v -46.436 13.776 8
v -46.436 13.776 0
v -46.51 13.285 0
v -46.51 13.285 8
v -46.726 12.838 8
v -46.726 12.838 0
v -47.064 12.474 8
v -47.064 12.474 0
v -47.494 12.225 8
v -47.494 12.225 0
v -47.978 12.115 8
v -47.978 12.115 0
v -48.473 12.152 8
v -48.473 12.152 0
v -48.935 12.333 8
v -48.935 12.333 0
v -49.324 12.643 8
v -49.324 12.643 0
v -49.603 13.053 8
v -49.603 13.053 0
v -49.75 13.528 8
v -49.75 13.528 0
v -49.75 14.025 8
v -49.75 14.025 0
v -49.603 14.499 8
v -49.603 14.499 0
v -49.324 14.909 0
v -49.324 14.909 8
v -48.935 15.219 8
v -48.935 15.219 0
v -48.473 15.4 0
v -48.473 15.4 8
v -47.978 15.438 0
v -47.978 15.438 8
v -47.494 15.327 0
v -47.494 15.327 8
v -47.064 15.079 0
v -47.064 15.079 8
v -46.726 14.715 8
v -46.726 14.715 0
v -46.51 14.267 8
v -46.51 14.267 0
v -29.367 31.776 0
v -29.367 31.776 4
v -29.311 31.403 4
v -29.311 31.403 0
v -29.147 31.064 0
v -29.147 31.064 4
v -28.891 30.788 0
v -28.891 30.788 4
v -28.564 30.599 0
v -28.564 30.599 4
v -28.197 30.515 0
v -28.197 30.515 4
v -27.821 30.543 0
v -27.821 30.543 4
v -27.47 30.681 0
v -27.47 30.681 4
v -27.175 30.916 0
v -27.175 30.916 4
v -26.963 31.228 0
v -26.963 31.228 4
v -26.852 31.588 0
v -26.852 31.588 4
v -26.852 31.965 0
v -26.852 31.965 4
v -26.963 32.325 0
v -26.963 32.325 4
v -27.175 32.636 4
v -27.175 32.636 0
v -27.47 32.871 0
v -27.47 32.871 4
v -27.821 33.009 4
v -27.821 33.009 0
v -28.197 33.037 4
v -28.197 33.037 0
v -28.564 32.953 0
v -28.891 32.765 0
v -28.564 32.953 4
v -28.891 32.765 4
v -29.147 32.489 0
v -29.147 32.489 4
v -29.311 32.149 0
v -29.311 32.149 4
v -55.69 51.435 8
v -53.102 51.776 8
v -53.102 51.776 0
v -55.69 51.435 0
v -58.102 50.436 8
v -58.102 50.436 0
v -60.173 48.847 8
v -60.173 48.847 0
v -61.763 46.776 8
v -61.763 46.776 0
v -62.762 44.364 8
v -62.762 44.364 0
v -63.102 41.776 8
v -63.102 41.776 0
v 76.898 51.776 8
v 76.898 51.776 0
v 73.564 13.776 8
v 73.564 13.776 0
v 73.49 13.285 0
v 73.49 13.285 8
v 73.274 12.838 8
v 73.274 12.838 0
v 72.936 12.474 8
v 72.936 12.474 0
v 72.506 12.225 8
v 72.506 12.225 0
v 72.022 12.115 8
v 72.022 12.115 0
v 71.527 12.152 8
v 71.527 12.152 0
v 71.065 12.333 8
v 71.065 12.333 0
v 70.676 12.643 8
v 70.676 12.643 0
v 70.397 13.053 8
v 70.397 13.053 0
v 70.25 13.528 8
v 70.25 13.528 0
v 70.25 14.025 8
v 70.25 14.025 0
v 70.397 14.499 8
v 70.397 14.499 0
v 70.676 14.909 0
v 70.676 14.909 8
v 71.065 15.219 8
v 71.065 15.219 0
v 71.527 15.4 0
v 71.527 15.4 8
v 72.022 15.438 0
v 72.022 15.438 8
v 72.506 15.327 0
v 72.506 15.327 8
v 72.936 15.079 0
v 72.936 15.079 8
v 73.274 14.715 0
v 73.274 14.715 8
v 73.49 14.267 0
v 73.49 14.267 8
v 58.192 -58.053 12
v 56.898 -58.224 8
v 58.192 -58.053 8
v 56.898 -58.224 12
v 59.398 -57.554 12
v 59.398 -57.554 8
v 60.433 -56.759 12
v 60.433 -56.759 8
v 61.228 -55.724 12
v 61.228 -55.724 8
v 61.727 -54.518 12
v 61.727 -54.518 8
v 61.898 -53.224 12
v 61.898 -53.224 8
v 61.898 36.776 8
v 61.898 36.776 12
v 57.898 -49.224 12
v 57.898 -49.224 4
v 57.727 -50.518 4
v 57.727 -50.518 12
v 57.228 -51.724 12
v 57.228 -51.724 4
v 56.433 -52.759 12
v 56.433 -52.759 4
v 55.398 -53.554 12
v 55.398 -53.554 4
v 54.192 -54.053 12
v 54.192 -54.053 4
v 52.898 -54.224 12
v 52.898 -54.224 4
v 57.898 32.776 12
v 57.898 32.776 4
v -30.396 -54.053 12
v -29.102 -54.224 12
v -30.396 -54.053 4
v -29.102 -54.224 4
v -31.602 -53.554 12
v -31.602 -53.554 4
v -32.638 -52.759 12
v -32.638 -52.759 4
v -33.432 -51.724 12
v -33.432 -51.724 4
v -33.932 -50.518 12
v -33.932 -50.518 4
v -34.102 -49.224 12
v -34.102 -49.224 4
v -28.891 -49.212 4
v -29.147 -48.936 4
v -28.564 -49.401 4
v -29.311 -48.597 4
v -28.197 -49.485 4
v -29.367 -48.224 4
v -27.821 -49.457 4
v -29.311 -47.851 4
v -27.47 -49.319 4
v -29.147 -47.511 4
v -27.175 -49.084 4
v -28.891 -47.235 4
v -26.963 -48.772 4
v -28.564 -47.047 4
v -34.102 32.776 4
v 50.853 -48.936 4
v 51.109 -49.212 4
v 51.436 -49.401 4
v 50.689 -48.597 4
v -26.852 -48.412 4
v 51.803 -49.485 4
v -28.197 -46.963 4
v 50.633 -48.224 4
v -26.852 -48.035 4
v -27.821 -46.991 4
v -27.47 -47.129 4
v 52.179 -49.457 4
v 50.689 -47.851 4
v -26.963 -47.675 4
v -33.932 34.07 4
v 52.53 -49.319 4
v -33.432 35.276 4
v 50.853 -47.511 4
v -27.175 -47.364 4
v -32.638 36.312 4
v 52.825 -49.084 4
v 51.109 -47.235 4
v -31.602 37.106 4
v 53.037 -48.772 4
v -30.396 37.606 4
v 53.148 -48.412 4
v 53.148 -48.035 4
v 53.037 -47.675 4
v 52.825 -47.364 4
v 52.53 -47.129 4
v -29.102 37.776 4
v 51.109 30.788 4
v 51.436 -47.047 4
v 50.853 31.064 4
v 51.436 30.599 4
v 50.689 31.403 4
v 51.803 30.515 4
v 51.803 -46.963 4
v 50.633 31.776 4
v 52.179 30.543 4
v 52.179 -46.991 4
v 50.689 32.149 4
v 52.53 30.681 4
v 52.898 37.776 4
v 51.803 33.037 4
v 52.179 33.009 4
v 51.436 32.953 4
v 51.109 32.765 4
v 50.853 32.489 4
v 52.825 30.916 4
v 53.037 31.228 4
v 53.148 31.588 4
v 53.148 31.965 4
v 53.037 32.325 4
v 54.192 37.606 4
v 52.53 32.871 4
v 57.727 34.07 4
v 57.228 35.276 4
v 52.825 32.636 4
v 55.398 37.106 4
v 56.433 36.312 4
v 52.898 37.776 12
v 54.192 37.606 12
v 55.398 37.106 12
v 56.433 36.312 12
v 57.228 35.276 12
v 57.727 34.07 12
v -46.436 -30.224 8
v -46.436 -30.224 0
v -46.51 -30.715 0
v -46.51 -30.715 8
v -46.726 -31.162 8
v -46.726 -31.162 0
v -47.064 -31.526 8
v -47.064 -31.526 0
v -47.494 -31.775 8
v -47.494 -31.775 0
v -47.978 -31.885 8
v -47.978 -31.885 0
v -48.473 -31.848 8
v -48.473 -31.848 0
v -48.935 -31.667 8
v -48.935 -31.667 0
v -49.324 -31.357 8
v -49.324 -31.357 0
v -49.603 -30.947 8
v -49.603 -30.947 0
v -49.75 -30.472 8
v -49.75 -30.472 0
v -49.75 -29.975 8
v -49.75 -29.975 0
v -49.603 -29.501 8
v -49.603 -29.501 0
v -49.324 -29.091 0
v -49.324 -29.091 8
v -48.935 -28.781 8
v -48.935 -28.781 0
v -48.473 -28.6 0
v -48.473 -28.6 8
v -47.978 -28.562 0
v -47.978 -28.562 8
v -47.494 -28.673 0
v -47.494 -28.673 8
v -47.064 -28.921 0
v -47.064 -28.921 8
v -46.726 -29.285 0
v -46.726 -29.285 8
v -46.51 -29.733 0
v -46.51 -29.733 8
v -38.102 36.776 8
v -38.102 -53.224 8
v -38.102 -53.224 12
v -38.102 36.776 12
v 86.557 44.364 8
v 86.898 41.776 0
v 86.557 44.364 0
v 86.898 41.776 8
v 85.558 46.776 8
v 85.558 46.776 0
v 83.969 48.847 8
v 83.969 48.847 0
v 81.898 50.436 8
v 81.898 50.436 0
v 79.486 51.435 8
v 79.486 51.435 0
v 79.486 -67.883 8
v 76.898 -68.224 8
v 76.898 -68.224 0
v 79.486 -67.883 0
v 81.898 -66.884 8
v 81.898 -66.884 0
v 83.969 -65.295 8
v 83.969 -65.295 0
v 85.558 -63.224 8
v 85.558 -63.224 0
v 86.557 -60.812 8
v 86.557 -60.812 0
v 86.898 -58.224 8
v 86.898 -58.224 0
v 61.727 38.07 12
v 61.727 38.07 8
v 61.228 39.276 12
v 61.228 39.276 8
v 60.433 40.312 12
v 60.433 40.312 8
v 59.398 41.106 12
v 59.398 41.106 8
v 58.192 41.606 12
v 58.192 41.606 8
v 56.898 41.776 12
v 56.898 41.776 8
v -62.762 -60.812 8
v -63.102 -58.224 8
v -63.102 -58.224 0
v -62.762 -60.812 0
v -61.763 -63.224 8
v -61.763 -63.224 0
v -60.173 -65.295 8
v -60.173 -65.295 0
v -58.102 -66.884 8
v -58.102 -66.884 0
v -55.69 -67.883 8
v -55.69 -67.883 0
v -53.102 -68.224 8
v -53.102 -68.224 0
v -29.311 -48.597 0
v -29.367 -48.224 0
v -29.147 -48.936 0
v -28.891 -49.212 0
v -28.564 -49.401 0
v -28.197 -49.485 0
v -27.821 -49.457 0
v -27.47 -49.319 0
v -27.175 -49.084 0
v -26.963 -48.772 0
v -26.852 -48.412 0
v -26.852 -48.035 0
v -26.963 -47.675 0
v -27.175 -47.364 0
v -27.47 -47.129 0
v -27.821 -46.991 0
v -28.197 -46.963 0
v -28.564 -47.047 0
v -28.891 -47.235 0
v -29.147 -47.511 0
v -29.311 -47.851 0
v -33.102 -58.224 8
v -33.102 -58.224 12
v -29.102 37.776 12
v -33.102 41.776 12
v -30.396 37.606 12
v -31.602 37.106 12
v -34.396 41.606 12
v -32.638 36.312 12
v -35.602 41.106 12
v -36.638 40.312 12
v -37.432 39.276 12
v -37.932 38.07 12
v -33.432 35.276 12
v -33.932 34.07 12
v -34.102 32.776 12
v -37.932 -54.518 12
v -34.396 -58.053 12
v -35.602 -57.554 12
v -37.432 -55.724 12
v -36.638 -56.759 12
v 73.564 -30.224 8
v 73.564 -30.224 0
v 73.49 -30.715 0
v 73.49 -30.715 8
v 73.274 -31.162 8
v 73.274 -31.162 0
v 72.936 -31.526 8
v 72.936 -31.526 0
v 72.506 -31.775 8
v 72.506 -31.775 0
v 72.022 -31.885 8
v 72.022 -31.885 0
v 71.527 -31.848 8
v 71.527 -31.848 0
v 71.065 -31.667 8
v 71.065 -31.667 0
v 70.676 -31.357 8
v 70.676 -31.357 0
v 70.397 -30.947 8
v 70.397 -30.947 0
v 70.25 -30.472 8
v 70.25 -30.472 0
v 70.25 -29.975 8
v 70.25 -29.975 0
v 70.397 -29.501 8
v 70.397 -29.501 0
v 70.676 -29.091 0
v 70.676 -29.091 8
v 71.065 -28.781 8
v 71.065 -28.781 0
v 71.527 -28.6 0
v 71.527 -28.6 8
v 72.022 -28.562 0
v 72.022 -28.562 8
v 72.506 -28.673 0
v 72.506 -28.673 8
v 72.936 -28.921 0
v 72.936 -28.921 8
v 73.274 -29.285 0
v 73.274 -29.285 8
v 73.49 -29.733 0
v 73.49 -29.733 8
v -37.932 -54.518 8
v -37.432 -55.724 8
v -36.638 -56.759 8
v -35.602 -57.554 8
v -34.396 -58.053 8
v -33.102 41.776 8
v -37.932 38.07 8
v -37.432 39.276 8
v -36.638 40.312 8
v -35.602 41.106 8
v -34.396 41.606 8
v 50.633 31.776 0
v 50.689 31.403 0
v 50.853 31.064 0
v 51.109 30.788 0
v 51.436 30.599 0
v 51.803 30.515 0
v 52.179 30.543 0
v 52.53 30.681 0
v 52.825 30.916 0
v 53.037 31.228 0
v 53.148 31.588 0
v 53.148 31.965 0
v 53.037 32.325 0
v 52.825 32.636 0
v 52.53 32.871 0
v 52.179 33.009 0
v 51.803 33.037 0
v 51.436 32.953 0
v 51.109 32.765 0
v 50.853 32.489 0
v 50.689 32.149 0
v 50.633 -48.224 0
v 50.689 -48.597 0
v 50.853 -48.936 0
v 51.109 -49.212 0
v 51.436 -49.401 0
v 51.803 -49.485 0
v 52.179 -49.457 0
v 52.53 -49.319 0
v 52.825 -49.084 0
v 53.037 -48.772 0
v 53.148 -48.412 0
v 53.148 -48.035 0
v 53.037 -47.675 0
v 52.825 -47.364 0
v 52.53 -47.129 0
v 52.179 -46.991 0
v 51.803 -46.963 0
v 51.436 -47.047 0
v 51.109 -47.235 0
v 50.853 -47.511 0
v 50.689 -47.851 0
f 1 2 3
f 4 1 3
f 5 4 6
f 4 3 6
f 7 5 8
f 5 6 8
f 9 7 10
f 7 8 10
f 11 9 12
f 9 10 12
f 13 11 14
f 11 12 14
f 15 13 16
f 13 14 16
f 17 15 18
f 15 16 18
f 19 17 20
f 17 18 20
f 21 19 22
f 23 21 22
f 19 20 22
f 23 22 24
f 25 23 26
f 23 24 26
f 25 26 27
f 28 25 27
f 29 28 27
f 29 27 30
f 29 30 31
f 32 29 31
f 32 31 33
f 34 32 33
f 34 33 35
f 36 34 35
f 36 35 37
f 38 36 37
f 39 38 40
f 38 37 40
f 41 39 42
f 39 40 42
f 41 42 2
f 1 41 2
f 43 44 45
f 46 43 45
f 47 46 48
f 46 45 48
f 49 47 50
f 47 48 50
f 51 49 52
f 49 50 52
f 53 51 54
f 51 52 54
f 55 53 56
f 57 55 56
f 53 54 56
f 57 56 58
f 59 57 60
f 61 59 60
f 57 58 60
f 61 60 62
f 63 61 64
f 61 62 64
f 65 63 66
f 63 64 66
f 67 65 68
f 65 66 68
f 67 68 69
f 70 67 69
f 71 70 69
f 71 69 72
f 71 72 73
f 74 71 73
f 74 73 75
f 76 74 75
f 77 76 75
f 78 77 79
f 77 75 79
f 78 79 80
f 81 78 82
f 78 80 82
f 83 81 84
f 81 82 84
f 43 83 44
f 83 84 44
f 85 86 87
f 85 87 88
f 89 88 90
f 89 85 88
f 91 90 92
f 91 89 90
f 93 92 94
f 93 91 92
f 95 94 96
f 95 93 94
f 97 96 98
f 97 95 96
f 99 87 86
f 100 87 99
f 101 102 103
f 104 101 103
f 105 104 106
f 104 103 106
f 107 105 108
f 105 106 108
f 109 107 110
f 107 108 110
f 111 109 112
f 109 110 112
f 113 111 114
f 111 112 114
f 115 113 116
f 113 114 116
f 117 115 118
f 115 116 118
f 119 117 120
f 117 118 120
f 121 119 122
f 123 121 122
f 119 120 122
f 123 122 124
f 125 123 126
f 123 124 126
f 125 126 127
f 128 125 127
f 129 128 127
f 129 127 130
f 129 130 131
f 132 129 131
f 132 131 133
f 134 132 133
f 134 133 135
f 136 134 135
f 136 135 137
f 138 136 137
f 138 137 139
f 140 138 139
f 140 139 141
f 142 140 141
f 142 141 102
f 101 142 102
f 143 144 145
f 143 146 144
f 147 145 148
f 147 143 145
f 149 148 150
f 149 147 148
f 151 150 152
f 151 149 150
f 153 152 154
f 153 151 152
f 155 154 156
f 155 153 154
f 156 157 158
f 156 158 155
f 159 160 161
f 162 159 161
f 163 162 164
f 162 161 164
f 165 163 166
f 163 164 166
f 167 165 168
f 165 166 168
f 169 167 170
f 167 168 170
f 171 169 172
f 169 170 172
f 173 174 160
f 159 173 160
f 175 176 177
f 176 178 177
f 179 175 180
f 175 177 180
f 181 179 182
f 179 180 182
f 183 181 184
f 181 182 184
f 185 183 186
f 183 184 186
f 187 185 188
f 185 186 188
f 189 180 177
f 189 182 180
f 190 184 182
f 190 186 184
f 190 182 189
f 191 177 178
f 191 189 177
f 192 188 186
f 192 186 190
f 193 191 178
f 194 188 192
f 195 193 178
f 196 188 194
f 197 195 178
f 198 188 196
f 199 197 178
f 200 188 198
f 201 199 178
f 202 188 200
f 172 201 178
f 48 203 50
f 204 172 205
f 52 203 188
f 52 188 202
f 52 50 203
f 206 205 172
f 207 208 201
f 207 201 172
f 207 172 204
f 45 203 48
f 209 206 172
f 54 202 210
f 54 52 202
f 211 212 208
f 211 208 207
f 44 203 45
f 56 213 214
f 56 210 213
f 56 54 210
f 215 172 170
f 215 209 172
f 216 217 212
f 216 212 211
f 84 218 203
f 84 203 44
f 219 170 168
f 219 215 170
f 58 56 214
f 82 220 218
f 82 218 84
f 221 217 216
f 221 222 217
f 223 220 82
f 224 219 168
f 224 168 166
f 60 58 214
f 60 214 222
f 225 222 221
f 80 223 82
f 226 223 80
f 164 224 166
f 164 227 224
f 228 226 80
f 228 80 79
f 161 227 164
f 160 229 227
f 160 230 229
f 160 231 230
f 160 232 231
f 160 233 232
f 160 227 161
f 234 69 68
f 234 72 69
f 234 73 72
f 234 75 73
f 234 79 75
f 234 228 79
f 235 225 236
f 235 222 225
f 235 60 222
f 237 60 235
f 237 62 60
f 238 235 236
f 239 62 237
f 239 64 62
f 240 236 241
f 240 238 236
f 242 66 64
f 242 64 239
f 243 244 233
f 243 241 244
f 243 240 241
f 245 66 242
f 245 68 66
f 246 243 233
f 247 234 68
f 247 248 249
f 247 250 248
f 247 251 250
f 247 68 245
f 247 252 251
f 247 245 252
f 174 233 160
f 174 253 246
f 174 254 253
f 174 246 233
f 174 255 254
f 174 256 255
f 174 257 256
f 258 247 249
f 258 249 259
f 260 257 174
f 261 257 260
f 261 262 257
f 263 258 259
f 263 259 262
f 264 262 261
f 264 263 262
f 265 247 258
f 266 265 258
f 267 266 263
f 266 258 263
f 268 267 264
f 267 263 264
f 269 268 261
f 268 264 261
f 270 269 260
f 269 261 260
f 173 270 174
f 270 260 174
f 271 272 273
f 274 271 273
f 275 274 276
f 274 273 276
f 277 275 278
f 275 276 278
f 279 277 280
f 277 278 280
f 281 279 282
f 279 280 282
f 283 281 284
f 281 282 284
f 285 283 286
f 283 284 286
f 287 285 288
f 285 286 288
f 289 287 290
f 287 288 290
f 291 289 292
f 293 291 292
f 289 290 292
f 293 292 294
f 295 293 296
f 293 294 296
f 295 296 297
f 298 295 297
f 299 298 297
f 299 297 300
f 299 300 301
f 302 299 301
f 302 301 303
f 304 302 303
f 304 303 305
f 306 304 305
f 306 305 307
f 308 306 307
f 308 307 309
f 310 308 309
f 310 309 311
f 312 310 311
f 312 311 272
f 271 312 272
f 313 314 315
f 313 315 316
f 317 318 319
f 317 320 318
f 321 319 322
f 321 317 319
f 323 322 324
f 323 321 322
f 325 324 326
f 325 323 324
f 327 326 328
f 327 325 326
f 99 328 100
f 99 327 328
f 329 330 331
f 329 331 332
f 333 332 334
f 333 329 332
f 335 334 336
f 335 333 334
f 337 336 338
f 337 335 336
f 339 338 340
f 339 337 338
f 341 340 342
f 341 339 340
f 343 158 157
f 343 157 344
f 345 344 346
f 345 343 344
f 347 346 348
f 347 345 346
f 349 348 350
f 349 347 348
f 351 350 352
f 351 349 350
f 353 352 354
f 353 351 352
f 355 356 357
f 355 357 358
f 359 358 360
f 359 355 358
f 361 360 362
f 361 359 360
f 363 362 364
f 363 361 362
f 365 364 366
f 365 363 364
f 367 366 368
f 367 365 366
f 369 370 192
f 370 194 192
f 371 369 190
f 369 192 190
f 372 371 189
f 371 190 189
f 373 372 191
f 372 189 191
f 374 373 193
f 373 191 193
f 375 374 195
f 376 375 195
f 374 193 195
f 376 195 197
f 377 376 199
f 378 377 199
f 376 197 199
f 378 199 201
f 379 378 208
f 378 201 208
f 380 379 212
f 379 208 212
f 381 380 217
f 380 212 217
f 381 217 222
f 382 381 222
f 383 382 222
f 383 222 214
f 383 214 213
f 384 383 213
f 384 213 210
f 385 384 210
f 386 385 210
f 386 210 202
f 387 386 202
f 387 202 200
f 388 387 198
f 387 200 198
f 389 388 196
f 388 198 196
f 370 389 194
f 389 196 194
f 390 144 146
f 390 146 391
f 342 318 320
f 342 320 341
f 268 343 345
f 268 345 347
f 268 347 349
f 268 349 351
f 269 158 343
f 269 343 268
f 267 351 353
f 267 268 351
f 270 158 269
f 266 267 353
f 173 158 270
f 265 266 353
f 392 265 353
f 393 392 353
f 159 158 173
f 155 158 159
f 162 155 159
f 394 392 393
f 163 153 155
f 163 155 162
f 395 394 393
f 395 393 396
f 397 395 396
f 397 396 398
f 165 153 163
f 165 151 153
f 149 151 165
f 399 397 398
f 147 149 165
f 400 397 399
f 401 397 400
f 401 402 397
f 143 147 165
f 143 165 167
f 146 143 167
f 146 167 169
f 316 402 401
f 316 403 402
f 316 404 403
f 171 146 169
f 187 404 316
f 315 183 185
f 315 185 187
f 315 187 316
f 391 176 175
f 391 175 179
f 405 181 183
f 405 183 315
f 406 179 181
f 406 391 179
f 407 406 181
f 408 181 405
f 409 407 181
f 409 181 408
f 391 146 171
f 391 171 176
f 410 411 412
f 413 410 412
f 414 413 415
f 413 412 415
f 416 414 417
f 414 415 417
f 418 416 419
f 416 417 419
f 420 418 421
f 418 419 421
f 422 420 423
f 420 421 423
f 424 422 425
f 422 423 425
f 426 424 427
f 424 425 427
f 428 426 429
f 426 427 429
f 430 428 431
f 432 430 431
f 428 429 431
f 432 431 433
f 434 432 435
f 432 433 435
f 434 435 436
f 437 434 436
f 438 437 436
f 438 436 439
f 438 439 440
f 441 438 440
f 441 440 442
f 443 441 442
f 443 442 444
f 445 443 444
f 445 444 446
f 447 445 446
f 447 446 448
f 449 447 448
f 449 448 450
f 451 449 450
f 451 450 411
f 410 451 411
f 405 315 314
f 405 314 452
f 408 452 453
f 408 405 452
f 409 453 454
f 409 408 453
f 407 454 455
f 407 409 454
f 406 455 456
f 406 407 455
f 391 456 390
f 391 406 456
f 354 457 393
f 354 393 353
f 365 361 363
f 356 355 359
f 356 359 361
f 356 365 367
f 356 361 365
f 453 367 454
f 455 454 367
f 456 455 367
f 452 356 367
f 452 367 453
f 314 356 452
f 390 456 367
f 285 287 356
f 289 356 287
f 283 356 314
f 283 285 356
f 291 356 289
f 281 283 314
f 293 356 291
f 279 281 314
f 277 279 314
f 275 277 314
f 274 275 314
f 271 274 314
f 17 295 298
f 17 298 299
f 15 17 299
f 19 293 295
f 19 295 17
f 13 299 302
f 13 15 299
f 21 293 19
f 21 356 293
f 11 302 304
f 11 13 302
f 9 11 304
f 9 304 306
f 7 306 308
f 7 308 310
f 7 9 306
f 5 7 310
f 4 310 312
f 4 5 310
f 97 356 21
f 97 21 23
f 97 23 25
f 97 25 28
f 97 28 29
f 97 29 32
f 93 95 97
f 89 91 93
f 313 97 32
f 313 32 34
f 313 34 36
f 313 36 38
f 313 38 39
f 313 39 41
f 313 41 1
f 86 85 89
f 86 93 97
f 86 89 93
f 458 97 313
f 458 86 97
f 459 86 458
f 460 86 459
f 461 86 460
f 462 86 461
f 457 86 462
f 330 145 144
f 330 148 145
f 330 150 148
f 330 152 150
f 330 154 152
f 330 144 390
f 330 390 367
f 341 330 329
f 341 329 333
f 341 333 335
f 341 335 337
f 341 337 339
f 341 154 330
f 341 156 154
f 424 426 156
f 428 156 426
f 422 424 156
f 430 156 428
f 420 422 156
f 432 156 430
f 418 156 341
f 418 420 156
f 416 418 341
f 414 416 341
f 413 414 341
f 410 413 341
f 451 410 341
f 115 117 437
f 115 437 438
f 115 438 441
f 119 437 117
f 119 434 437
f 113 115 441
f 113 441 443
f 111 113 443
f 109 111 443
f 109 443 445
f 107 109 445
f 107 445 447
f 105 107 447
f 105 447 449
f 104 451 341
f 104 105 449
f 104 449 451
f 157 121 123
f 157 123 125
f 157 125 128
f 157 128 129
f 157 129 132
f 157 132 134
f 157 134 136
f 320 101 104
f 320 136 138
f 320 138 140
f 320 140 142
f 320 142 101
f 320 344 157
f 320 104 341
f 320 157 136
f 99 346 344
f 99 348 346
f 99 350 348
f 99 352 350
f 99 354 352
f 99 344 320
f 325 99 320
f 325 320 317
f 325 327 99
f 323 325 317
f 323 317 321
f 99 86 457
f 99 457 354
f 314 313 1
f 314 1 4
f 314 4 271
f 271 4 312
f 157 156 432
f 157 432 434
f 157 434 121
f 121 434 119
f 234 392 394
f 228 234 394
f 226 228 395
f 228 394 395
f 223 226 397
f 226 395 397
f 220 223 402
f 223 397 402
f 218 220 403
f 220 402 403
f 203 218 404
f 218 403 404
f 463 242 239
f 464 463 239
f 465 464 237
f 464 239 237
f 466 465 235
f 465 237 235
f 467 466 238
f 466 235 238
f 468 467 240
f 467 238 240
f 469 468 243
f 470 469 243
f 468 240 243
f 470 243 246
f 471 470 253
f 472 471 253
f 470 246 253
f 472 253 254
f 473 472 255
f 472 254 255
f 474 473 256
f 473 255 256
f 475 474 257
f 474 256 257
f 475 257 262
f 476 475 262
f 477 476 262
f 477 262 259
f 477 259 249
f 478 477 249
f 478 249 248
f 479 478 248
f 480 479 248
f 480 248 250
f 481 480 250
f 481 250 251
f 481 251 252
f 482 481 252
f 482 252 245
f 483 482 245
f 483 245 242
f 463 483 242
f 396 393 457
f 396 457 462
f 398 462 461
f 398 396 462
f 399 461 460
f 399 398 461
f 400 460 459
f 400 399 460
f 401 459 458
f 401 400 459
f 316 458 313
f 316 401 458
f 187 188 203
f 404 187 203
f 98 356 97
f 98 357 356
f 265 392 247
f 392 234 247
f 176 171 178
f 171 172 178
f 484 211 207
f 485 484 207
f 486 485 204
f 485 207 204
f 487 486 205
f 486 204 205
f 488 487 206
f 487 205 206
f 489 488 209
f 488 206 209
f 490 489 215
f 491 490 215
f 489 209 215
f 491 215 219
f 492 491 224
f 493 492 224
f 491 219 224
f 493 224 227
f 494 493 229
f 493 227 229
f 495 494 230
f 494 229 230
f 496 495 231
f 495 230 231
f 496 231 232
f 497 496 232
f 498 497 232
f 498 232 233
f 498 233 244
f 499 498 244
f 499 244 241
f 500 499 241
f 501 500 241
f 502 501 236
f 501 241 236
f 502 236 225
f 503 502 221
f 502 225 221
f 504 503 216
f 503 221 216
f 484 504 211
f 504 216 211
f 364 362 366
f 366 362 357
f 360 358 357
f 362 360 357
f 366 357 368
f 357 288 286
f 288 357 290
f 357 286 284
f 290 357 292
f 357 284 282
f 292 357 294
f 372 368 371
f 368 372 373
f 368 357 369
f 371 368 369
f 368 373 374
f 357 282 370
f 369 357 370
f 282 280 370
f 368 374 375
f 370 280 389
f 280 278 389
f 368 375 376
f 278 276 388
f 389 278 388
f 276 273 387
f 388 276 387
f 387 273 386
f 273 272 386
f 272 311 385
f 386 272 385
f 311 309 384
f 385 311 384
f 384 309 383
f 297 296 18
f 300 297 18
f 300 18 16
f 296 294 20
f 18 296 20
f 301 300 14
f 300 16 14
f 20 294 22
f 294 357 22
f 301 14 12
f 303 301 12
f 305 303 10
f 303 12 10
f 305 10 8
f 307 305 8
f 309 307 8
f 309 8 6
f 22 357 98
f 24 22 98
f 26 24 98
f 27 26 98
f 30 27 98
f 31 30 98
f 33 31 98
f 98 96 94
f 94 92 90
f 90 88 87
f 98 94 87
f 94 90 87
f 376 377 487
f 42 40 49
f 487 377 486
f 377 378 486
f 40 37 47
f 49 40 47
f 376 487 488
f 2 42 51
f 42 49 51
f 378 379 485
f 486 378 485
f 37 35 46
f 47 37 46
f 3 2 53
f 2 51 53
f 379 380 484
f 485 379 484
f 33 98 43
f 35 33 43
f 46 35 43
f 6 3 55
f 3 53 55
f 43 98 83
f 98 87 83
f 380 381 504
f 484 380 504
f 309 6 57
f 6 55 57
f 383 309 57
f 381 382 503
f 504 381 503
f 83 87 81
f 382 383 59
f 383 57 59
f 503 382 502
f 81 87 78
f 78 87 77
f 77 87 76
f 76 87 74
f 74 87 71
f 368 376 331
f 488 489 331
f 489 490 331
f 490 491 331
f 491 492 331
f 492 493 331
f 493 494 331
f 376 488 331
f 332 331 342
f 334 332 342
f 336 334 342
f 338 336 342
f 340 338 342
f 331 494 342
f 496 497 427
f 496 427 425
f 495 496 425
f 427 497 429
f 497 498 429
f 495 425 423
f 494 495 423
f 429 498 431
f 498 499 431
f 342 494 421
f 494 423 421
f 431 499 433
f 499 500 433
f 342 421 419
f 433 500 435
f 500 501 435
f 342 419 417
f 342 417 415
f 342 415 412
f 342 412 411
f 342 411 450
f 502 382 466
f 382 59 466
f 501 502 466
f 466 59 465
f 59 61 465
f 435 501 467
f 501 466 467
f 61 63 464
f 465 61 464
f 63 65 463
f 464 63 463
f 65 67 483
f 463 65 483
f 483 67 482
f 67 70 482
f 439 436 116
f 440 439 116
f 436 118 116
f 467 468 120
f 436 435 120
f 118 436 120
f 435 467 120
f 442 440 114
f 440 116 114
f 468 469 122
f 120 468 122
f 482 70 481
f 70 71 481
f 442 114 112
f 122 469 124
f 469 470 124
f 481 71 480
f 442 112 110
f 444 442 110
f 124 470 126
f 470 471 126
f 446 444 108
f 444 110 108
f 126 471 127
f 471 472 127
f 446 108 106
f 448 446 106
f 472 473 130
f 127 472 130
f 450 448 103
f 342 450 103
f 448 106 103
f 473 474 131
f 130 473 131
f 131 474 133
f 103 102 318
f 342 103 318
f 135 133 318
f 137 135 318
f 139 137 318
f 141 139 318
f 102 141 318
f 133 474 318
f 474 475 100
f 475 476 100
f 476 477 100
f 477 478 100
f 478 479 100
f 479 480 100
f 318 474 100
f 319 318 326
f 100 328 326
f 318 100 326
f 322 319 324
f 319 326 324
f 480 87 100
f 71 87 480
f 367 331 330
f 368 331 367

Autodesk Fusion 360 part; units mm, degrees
sketch "스케치1" plane through (0, 0, 0) normal (0, 0, 1) x (1, 0, 0)
  line L0 (-63.1023, 51.7762) -> (86.8977, 51.7762)
  line L1 (86.8977, 51.7762) -> (86.8977, -68.2238)
  line L2 (86.8977, -68.2238) -> (-63.1023, -68.2238)
  line L3 (-63.1023, -68.2238) -> (-63.1023, 51.7762)
  line L4 (-63.1023, -8.2238) -> (86.8977, -8.2238) construction
  point P0 (-63.1023, -8.2238)
  point P1 (86.8977, -8.2238)
  point P2 (11.8977, -8.2238)
  dimension "d1" = 150
  dimension "d2" = 120
sketch "스케치3" plane through (0, 0, 0) normal (0, 0, 1) x (1, 0, 0)
extrude "돌출2" add sketch "스케치1" along normal blind 8
sketch "스케치4" plane through (0, 0, 8) normal (0, 0, 1) x (-1, 0, 0)
  line L0 (63.1023, 68.2238) -> (-86.8977, 68.2238)
  line L1 (-86.8977, 68.2238) -> (-86.8977, -51.7762)
  line L2 (-86.8977, -51.7762) -> (63.1023, -51.7762)
  line L3 (63.1023, -51.7762) -> (63.1023, 68.2238)
  line L4 (38.1023, -41.7762) -> (-61.8977, -41.7762)
  line L5 (-61.8977, -41.7762) -> (-61.8977, 58.2238)
  line L6 (-61.8977, 58.2238) -> (38.1023, 58.2238)
  line L7 (38.1023, 58.2238) -> (38.1023, -41.7762)
  line L8 (34.1023, -37.7762) -> (-57.8977, -37.7762)
  line L9 (-57.8977, -37.7762) -> (-57.8977, 54.2238)
  line L10 (-57.8977, 54.2238) -> (34.1023, 54.2238)
  line L11 (34.1023, 54.2238) -> (34.1023, -37.7762)
  line L12 (63.1023, -51.7762) -> (-86.8977, -51.7762)
  line L13 (-86.8977, 68.2238) -> (63.1023, 68.2238)
  line L14 (-11.8977, -51.7762) -> (-11.8977, 68.2238) construction
  line L15 (63.1023, 68.2238) -> (63.1023, -51.7762) construction
  line L16 (63.1023, 8.2238) -> (-86.8977, 8.2238) construction
  line L17 (-11.8977, -41.7762) -> (-11.8977, 58.2238) construction
  line L18 (38.1023, 8.2238) -> (-61.8977, 8.2238) construction
  line L19 (34.1023, 8.2238) -> (-57.8977, 8.2238) construction
  point P0 (-11.8977, -51.7762)
  point P1 (-11.8977, 68.2238)
  point P2 (63.1023, 8.2238)
  point P3 (-86.8977, 8.2238)
  point P4 (-11.8977, -41.7762)
  point P5 (-11.8977, 58.2238)
  point P6 (38.1023, 8.2238)
  point P7 (-61.8977, 8.2238)
  point P8 (-11.8977, 8.2238)
  point P9 (34.1023, 8.2238)
  point P10 (-57.8977, 8.2238)
  point P11 (-11.8977, 8.2238)
  point P12 (-11.8977, 8.2238)
  dimension "d9" = 100
  dimension "d10" = 100
  dimension "d11" = 92
  dimension "d12" = 92
extrude "돌출3" add sketch "스케치4" along normal blind 4 contours L4 L5 L6 L7
extrude "돌출4" cut 1 faces at (-3.4356, 7.1096, 8) along direction (0, 0, -1) blind 4
sketch "스케치6" plane through (0, 0, 0) normal (0, 0, 1) x (1, 0, 0)
sketch "스케치7" plane through (0, 0, 0) normal (0, 0, 1) x (1, 0, 0)
  line L0 (71.8977, 13.7762) -> (-48.1023, 13.7762) construction
  line L1 (-48.1023, 13.7762) -> (-48.1023, -30.2238) construction
  line L2 (-48.1023, -30.2238) -> (71.8977, -30.2238) construction
  line L3 (71.8977, -30.2238) -> (71.8977, 13.7762) construction
  line L4 (71.8977, -8.2238) -> (-48.1023, -8.2238) construction
  circle A0 centre (71.8977, 13.7762) radius 2
  circle A1 centre (71.8977, -30.2238) radius 2
  circle A2 centre (-48.1023, 13.7762) radius 2
  circle A3 centre (-48.1023, -30.2238) radius 2
  point P0 (71.8977, -8.2238)
  point P1 (-48.1023, -8.2238)
  point P2 (11.8977, -8.2238)
  point P3 (11.8977, -8.2238)
  dimension "d17" = 120
  dimension "d18" = 44
  dimension "d19" = 4
  dimension "d20" = 4
extrude "돌출5" cut sketch "스케치7" along normal blind 10
sketch "스케치8" plane through (0, 0, 4) normal (0, 0, 1) x (-1, 0, 0)
  line L0 (-57.8977, 54.2238) -> (-57.8977, -37.7762)
  line L1 (-57.8977, -37.7762) -> (34.1023, -37.7762)
  line L2 (34.1023, -37.7762) -> (34.1023, 54.2238)
  line L3 (34.1023, 54.2238) -> (-57.8977, 54.2238)
  line L4 (28.1023, -31.7762) -> (-51.8977, -31.7762) construction
  line L5 (-51.8977, -31.7762) -> (-51.8977, 48.2238) construction
  line L6 (-51.8977, 48.2238) -> (28.1023, 48.2238) construction
  line L7 (28.1023, 48.2238) -> (28.1023, -31.7762) construction
  line L8 (34.1023, 8.2238) -> (-57.8977, 8.2238) construction
  line L9 (28.1023, 8.2238) -> (-51.8977, 8.2238) construction
  circle A0 centre (28.1023, -31.7762) radius 3.5748
  circle A1 centre (-51.8977, -31.7762) radius 3.0869
  circle A2 centre (-51.8977, 48.2238) radius 2.1374
  circle A3 centre (28.1023, 48.2238) radius 4.474
  point P0 (34.1023, 8.2238)
  point P1 (-57.8977, 8.2238)
  point P2 (-11.8977, 8.2238)
  point P3 (28.1023, 8.2238)
  point P4 (-51.8977, 8.2238)
  point P5 (-11.8977, 8.2238)
  dimension "d23" = 80
  dimension "d24" = 80
extrude "돌출6" cut sketch "스케치8" against normal blind 5 contours A0 | A1 | A2 | A3
fillet "모깎기6" radius 10 1 edges at (86.8977, -68.2238, 4)
fillet "모깎기7" radius 10 1 edges at (86.8977, 51.7762, 4)
fillet "모깎기8" radius 5 1 edges at (61.8977, -58.2238, 10)
fillet "모깎기9" radius 5 1 edges at (61.8977, 41.7762, 10)
fillet "모깎기10" radius 5 1 edges at (-38.1023, -58.2238, 10)
fillet "모깎기11" radius 5 1 edges at (-38.1023, 41.7762, 10)
fillet "모깎기12" radius 10 1 edges at (-63.1023, -68.2238, 4)
fillet "모깎기13" radius 10 1 edges at (-63.1023, 51.7762, 4)
fillet "모깎기14" radius 5 1 edges at (57.8977, -54.2238, 8)
fillet "모깎기15" radius 5 1 edges at (57.8977, 37.7762, 8)
fillet "모깎기16" radius 5 1 edges at (-34.1023, 37.7762, 8)
fillet "모깎기17" radius 5 1 edges at (-34.1023, -54.2238, 8)
thread "스레드1" "ISO Metric profile 3.0 M3x0.5 6H" major diameter 3.086 minor diameter 2.529 pitch 0.5 angle 60 resizes the face on face at (-31.6593, 32.1322, 1.3333)
thread "스레드2" "ISO Metric profile 3.0 M3x0.5 6H" major diameter 3.086 minor diameter 2.529 pitch 0.5 angle 60 resizes the face on face at (-32.5541, -47.7783, 1.3333)
thread "스레드3" "ISO Metric profile 3.0 M3x0.5 6H" major diameter 3.086 minor diameter 2.529 pitch 0.5 angle 60 resizes the face on face at (48.8262, 32.0836, 1.3333)
thread "스레드4" "ISO Metric profile 3.0 M3x0.5 6H" major diameter 3.086 minor diameter 2.529 pitch 0.5 angle 60 resizes the face on face at (49.7709, -48.011, 1.3333)
thread "스레드5" "ISO Metric profile 4.0 M4x0.7 6H" major diameter 4.1095 minor diameter 3.332 pitch 0.7 angle 60 resizes the face on face at (73.492, 14.9838, 2.6667)
thread "스레드6" "ISO Metric profile 4.0 M4x0.7 6H" major diameter 4.1095 minor diameter 3.332 pitch 0.7 angle 60 resizes the face on face at (70.5012, -31.6555, 5.3333)
thread "스레드7" "ISO Metric profile 4.0 M4x0.7 6H" major diameter 4.1095 minor diameter 3.332 pitch 0.7 angle 60 resizes the face on face at (-46.1048, 13.8759, 2.6667)
thread "스레드8" "ISO Metric profile 4.0 M4x0.7 6H" major diameter 4.1095 minor diameter 3.332 pitch 0.7 angle 60 resizes the face on face at (-46.1048, -30.1241, 2.6667)
fillet "모깎기1" [suppressed]
fillet "모깎기2" [suppressed]
fillet "모깎기3" [suppressed]
fillet "모깎기4" [suppressed]
fillet "모깎기5" [suppressed]
sketch "스케치5" plane through (0, 0, 8) normal (0, 0, 1) x (-1, 0, 0)
  line L0 (63.1023, 68.2238) -> (-86.8977, 68.2238)
  line L1 (-86.8977, 68.2238) -> (-86.8977, -51.7762)
  line L2 (-86.8977, -51.7762) -> (63.1023, -51.7762)
  line L3 (63.1023, -51.7762) -> (63.1023, 68.2238)
  line L4 (38.1023, 58.2238) -> (38.1023, -41.7762)
  line L5 (38.1023, -41.7762) -> (-61.8977, -41.7762)
  line L6 (-61.8977, -41.7762) -> (-61.8977, 58.2238)
  line L7 (-61.8977, 58.2238) -> (38.1023, 58.2238)
  line L8 (52.6316, -44.9948) -> (-78.4313, -44.9948) construction
  line L9 (-78.4313, -44.9948) -> (-78.4313, 47.678) construction
  line L10 (-78.4313, 47.678) -> (52.6316, 47.678) construction
  line L11 (52.6316, 47.678) -> (52.6316, -44.9948) construction
extrude "돌출1" [suppressed]
sketch "스케치2" plane through (0, 0, 8) normal (0, 0, 1) x (-1, 0, 0)
  line L0 (63.1023, 48.2238) -> (-86.8977, 48.2238)
  line L1 (-86.8977, 48.2238) -> (-86.8977, -51.7762)
  line L2 (-86.8977, -51.7762) -> (63.1023, -51.7762)
  line L3 (63.1023, -51.7762) -> (63.1023, 48.2238)
  line L4 (40.9967, -38.1097) -> (-57.0033, -38.1097)
  line L5 (-57.0033, -38.1097) -> (-57.0033, 32.143)
  line L6 (-57.0033, 32.143) -> (40.9967, 32.143)
  line L7 (40.9967, 32.143) -> (40.9967, -38.1097)
  line L8 (26.9462, -28.1011) -> (-55, -28.1011)
  line L9 (-55, -28.1011) -> (-55, 20)
  line L10 (-55, 20) -> (26.9462, 20)
  line L11 (26.9462, 20) -> (26.9462, -28.1011)
  dimension "d5" = 98
  dimension "d6" = 70.2526
